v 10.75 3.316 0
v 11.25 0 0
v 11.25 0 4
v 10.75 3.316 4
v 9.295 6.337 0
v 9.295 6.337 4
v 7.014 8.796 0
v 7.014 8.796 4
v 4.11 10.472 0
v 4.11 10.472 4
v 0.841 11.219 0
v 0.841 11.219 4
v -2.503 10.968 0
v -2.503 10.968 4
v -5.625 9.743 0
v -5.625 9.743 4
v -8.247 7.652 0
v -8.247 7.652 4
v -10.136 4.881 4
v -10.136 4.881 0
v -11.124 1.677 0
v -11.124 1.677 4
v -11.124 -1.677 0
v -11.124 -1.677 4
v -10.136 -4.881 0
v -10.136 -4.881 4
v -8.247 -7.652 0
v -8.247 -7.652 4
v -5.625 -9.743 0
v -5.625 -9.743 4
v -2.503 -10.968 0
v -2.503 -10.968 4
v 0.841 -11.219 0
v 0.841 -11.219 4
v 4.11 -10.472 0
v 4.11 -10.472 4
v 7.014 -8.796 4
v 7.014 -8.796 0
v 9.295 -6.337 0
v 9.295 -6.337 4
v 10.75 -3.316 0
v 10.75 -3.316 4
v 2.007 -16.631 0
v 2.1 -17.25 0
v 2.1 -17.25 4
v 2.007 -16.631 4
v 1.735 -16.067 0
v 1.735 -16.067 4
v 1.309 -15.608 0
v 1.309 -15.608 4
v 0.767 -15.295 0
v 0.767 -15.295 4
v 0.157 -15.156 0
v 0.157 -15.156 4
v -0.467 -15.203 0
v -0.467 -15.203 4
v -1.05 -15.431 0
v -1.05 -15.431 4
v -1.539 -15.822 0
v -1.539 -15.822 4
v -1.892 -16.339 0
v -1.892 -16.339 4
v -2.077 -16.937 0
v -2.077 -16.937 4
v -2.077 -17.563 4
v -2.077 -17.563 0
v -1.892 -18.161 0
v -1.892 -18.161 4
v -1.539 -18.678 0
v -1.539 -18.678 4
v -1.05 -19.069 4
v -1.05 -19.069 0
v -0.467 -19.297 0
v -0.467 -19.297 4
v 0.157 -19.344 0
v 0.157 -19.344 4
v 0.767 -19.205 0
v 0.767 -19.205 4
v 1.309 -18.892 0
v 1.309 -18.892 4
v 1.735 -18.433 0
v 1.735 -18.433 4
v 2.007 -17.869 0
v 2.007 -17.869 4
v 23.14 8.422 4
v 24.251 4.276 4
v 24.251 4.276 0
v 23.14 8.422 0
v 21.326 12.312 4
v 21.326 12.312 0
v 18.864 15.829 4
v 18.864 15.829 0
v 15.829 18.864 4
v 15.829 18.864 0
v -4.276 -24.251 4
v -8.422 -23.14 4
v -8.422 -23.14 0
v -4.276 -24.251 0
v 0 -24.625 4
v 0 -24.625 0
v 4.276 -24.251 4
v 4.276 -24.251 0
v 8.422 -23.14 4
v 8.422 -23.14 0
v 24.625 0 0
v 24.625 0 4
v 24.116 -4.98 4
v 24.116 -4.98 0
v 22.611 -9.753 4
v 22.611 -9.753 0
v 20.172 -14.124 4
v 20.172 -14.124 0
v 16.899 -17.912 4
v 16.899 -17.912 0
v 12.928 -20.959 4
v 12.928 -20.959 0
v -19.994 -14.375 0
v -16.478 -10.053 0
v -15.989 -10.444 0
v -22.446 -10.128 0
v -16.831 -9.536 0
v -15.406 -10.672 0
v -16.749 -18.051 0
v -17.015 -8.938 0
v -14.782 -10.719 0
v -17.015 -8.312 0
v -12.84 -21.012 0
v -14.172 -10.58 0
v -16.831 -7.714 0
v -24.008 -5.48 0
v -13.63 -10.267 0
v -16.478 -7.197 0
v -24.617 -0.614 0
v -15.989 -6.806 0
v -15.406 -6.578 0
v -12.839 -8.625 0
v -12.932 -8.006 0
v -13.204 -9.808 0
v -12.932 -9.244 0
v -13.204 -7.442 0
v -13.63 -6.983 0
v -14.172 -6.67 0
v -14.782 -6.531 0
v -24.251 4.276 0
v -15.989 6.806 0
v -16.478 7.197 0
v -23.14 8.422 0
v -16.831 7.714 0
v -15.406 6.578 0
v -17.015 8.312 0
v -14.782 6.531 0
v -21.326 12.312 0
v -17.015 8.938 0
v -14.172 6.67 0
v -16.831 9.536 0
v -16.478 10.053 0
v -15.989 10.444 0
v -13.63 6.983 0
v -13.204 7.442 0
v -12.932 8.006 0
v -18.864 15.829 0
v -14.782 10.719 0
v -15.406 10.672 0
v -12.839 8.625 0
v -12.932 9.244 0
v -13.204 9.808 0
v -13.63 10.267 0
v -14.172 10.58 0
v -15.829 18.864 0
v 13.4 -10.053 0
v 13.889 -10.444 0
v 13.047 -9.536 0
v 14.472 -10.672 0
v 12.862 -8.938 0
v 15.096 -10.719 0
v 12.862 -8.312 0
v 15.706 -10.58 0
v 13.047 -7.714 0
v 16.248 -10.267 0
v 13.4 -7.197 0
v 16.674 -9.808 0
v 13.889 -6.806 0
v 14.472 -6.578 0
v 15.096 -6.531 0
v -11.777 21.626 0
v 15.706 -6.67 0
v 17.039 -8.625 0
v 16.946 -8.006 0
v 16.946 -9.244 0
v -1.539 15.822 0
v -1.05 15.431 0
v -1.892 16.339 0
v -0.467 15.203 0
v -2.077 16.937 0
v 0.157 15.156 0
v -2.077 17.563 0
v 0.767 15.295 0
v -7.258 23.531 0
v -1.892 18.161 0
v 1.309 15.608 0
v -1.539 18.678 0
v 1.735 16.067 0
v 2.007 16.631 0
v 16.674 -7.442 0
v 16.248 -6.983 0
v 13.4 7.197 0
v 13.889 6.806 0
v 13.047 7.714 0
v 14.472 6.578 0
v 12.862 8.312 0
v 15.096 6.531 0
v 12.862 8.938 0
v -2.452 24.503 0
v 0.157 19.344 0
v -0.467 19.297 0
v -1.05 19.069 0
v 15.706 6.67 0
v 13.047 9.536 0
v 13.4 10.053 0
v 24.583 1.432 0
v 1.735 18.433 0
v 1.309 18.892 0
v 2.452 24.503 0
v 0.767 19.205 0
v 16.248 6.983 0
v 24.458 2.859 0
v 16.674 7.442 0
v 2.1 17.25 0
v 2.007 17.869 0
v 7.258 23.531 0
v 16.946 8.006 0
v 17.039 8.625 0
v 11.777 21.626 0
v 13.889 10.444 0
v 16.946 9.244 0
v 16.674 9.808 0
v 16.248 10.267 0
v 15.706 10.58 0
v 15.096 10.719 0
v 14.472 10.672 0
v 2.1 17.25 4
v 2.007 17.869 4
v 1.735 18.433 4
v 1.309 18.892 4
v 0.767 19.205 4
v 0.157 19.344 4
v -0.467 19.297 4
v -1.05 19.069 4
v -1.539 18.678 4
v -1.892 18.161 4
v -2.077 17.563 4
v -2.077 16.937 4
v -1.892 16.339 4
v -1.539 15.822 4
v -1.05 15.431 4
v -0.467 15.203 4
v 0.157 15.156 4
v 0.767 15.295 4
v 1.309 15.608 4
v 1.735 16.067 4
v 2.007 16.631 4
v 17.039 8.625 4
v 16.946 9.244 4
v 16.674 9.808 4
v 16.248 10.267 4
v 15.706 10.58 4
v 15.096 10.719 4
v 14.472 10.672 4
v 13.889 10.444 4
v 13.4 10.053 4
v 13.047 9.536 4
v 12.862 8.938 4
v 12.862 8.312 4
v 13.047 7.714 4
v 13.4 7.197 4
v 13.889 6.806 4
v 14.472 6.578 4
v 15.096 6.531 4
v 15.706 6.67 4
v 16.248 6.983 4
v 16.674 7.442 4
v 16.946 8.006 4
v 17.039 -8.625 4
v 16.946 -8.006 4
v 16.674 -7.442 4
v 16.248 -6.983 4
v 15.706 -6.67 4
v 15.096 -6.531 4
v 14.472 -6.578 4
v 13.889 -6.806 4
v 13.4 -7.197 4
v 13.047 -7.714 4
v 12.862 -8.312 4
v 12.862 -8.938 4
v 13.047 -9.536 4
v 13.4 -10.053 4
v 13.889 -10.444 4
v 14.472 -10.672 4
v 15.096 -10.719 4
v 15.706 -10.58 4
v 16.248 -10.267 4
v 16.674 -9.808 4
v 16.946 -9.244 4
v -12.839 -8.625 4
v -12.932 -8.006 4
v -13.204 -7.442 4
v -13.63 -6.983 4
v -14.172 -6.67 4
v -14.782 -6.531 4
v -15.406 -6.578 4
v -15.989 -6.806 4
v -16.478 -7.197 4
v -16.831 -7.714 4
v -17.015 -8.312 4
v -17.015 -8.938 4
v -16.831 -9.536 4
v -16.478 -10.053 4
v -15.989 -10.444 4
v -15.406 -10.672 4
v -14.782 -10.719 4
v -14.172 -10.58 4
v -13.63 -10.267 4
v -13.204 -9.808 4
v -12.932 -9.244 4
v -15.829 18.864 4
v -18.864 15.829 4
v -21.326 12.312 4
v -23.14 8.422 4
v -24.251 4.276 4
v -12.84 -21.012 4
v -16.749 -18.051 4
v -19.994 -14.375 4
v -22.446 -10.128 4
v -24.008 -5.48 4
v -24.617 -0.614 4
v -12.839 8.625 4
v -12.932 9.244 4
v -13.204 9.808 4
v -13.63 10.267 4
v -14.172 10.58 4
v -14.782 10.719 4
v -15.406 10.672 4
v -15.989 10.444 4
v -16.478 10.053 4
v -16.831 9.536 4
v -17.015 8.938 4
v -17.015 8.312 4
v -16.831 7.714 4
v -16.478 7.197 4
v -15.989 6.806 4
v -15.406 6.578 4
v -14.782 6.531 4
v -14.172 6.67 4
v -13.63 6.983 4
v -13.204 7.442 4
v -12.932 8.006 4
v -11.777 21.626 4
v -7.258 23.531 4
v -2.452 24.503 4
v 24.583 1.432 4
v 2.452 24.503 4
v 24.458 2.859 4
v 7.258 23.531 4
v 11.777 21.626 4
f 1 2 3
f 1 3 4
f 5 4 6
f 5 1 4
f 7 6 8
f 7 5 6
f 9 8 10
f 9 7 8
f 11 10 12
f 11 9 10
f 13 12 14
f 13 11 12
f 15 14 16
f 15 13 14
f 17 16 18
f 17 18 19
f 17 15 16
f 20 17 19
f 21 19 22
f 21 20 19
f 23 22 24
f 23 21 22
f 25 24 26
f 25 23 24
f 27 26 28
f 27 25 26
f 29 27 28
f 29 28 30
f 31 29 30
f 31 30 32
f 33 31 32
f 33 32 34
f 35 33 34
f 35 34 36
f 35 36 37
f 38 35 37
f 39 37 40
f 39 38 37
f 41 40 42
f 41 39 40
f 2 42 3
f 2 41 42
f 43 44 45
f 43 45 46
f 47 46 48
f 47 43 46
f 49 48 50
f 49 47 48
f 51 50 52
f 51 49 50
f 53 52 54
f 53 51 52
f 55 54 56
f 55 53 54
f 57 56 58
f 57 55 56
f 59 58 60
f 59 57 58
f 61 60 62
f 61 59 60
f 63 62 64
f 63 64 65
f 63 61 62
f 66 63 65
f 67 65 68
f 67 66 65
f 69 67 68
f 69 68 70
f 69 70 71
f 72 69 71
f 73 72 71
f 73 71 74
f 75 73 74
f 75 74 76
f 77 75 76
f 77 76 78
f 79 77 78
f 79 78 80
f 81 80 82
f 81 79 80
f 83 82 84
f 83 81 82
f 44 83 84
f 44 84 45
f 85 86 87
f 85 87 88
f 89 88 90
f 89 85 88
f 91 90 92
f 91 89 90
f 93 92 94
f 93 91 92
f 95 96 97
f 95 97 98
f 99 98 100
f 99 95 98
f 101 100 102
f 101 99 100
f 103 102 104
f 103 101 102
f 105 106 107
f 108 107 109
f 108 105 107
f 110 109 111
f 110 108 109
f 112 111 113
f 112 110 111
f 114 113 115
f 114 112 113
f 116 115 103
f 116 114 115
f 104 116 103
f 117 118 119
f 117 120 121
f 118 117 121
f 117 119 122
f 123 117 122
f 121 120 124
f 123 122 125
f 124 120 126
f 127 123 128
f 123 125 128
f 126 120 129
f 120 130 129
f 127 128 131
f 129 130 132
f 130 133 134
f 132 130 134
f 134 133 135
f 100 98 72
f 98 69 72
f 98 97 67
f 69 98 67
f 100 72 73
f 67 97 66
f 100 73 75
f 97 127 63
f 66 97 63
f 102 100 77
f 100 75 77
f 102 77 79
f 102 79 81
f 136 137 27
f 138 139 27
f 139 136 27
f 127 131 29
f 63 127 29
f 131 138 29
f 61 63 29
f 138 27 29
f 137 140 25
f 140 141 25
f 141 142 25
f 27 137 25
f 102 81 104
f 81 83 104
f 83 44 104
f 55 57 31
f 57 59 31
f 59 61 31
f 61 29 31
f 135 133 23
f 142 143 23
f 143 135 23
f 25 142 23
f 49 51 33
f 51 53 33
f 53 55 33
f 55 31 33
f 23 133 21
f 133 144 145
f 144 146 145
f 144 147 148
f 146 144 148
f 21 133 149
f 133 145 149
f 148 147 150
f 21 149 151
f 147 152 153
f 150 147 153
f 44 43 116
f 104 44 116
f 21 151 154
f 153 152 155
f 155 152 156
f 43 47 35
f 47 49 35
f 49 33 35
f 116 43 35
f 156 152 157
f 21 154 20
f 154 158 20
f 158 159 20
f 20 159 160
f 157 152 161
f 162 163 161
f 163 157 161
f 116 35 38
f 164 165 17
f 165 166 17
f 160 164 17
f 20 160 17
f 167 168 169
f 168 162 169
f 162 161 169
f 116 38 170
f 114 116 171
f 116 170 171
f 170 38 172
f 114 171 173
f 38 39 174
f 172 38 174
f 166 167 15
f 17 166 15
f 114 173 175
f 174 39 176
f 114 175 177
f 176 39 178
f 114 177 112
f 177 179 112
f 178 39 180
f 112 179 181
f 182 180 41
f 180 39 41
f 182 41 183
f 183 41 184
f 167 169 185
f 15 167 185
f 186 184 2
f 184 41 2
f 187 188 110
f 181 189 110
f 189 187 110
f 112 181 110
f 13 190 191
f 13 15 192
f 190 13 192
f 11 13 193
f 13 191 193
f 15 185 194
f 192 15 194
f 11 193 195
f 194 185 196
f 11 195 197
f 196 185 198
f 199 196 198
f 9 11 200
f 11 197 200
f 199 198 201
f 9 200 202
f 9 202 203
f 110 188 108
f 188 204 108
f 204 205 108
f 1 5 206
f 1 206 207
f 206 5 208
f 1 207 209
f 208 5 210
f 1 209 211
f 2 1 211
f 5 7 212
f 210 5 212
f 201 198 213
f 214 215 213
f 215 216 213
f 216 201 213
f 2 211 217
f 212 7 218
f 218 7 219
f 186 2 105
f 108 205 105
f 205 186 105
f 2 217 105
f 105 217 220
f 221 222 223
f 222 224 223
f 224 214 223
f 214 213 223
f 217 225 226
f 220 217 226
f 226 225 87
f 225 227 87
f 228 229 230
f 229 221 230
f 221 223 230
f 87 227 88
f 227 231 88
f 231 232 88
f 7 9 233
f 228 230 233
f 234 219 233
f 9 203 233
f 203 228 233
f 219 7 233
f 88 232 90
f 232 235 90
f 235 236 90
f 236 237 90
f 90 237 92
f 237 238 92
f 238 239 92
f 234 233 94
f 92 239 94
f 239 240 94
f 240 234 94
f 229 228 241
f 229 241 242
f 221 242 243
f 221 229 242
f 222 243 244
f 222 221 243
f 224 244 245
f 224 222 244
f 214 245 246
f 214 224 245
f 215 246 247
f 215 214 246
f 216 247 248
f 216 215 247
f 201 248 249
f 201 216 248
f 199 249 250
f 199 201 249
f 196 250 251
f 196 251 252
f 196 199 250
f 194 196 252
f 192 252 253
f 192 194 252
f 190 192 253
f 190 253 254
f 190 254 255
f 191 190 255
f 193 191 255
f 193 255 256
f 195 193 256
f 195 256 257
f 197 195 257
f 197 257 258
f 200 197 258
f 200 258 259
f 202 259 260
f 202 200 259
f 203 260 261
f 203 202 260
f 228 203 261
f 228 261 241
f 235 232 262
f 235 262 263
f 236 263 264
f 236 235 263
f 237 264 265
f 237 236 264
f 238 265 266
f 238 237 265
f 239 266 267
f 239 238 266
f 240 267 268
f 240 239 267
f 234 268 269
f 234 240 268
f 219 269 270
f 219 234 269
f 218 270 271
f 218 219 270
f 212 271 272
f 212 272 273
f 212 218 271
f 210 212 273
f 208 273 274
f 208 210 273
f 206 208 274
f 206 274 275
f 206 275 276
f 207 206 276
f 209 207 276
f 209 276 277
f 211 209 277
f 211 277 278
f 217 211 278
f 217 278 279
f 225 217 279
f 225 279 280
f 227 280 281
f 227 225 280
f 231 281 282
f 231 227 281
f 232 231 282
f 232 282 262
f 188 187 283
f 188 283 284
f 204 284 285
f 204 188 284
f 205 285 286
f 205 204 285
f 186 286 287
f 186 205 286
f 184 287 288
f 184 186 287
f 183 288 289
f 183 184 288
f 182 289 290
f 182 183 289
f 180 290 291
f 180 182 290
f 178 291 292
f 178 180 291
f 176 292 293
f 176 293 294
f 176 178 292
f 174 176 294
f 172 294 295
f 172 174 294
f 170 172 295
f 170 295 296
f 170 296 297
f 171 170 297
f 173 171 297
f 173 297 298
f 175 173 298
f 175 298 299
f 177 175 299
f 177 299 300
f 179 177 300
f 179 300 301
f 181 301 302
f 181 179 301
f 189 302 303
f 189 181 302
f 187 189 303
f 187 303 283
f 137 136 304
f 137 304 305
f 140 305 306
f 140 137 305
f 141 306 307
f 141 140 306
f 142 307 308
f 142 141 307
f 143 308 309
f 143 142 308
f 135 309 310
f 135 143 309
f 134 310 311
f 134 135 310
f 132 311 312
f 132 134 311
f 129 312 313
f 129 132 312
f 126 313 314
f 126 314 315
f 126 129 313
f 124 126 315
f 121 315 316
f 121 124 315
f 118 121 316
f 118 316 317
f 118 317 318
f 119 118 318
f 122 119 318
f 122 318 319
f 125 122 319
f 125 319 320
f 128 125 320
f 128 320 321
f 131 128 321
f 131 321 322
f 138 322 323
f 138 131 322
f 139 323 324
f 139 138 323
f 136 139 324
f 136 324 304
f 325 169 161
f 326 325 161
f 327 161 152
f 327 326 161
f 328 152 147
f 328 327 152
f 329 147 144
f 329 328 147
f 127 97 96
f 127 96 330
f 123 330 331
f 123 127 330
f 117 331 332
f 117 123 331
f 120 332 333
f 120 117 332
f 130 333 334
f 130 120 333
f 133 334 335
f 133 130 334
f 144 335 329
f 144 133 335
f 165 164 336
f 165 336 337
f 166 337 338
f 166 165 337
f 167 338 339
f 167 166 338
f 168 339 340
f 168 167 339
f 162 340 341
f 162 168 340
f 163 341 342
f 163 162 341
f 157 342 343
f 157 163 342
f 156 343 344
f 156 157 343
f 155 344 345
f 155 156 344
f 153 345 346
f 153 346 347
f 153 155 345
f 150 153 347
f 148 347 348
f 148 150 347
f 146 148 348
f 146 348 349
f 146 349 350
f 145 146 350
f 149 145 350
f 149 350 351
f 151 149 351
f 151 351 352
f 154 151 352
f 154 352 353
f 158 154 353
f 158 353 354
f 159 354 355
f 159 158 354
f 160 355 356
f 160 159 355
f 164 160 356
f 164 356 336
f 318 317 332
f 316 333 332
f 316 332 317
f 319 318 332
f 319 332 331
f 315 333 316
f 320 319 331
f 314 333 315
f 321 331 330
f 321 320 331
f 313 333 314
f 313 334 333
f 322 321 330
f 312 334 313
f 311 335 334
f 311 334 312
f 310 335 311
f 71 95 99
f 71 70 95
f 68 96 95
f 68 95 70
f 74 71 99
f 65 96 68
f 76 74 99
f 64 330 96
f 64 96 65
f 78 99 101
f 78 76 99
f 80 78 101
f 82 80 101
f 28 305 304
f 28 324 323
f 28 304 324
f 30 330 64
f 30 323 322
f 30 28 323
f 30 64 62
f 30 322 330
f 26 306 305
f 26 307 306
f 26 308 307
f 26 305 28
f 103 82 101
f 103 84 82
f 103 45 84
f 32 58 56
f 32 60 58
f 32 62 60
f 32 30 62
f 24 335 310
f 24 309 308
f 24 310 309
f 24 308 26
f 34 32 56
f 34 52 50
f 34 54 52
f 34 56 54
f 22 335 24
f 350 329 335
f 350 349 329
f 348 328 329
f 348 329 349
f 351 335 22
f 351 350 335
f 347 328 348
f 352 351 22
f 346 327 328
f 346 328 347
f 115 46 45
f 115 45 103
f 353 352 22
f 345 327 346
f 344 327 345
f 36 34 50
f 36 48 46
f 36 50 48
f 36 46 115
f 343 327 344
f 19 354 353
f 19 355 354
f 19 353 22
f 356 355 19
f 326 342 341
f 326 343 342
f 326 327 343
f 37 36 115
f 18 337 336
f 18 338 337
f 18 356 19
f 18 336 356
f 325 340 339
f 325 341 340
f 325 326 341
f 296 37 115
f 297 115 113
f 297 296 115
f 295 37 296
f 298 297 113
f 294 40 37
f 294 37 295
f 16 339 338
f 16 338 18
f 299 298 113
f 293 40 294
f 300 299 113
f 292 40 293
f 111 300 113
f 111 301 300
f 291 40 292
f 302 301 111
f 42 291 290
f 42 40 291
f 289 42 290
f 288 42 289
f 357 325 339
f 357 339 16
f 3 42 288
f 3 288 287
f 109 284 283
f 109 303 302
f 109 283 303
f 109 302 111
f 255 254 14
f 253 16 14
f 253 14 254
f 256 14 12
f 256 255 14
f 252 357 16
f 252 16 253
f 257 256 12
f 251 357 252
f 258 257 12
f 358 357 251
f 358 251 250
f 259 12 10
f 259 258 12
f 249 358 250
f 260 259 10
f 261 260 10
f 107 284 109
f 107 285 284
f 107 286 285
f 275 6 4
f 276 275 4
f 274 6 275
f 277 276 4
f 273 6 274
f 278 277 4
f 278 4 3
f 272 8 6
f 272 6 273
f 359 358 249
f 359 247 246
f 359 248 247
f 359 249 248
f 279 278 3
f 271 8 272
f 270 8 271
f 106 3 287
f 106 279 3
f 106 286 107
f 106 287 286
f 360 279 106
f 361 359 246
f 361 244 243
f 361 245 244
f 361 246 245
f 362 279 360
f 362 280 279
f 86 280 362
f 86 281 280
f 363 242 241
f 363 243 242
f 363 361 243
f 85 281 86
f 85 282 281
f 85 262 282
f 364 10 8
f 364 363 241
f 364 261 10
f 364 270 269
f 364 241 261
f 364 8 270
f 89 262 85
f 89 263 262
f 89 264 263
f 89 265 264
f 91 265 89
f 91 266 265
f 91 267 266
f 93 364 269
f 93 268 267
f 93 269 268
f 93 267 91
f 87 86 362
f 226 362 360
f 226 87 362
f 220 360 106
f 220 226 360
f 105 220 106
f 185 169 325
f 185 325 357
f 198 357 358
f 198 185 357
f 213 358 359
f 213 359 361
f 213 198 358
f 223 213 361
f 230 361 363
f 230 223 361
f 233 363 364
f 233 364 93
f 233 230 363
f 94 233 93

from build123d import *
from build123d.topology import SkipClean

# Parameters (mm, degrees)
SKETCH_1_R          = 44
SKETCH_1_R_2        = 11.25
SKETCH_1_R_3        = 2.1
EXTRUDE_1_DEPTH     = 4
SKETCH_2_OUTSIDE_W  = 114.904
SKETCH_2_OUTSIDE_H  = 114.904
SKETCH_2_OUTSIDE_R  = 24.625
CUT_EXTRUDE_1_DEPTH = 10


with BuildPart() as part:
    # 草图1 → 凸台-拉伸1 (new body)
    with BuildSketch(Plane.XY):
        Circle(SKETCH_1_R)
        Circle(SKETCH_1_R_2, mode=Mode.SUBTRACT)
        with Locations((0, 17.25)):
            Circle(SKETCH_1_R_3, mode=Mode.SUBTRACT)
        with Locations((14.938938215, 8.625)):
            Circle(SKETCH_1_R_3, mode=Mode.SUBTRACT)
        with Locations((14.938938215, -8.625)):
            Circle(SKETCH_1_R_3, mode=Mode.SUBTRACT)
        with Locations((0, -17.25)):
            Circle(SKETCH_1_R_3, mode=Mode.SUBTRACT)
        with Locations((-14.938938215, -8.625)):
            Circle(SKETCH_1_R_3, mode=Mode.SUBTRACT)
        with Locations((-14.938938215, 8.625)):
            Circle(SKETCH_1_R_3, mode=Mode.SUBTRACT)
        with BuildLine():
            ThreePointArc((23.542096205, 28.056377729), (0, 36.625), (-23.542096205, 28.056377729))
            ThreePointArc((-23.542096205, 28.056377729), (-24.281637205, 19.603385412), (-15.828644889, 18.863844412))
            ThreePointArc((-15.828644889, 18.863844412), (0, 24.625), (15.828644889, 18.863844412))
            ThreePointArc((15.828644889, 18.863844412), (24.281637205, 19.603385412), (23.542096205, 28.056377729))
        make_face(mode=Mode.SUBTRACT)
        with BuildLine():
            ThreePointArc((12.526487749, -34.416242236), (31.718180414, -18.3125), (36.068583954, 6.359864507))
            ThreePointArc((36.068583954, 6.359864507), (29.11784837, 11.226821959), (24.250890918, 4.276086375))
            ThreePointArc((24.250890918, 4.276086375), (21.325875568, -12.3125), (8.422246029, -23.139930787))
            ThreePointArc((8.422246029, -23.139930787), (4.836211165, -30.830207372), (12.526487749, -34.416242236))
        make_face(mode=Mode.SUBTRACT)
        with BuildLine():
            ThreePointArc((-36.068583954, 6.359864507), (-31.718180414, -18.3125), (-12.526487749, -34.416242236))
            ThreePointArc((-12.526487749, -34.416242236), (-4.836211165, -30.830207372), (-8.422246029, -23.139930787))
            ThreePointArc((-8.422246029, -23.139930787), (-21.325875568, -12.3125), (-24.250890918, 4.276086375))
            ThreePointArc((-24.250890918, 4.276086375), (-29.11784837, 11.226821959), (-36.068583954, 6.359864507))
        make_face(mode=Mode.SUBTRACT)
    extrude(amount=EXTRUDE_1_DEPTH)

    # 草图2 outside → 切除-拉伸1 (cut)
    with SkipClean():  # the faces are left unmerged after this step: merging them gives an invalid solid
        with BuildSketch(Plane.XY.offset(4)):
            Rectangle(SKETCH_2_OUTSIDE_W, SKETCH_2_OUTSIDE_H)
            Circle(SKETCH_2_OUTSIDE_R, mode=Mode.SUBTRACT)
        extrude(amount=-CUT_EXTRUDE_1_DEPTH, mode=Mode.SUBTRACT)


solid = part.part
